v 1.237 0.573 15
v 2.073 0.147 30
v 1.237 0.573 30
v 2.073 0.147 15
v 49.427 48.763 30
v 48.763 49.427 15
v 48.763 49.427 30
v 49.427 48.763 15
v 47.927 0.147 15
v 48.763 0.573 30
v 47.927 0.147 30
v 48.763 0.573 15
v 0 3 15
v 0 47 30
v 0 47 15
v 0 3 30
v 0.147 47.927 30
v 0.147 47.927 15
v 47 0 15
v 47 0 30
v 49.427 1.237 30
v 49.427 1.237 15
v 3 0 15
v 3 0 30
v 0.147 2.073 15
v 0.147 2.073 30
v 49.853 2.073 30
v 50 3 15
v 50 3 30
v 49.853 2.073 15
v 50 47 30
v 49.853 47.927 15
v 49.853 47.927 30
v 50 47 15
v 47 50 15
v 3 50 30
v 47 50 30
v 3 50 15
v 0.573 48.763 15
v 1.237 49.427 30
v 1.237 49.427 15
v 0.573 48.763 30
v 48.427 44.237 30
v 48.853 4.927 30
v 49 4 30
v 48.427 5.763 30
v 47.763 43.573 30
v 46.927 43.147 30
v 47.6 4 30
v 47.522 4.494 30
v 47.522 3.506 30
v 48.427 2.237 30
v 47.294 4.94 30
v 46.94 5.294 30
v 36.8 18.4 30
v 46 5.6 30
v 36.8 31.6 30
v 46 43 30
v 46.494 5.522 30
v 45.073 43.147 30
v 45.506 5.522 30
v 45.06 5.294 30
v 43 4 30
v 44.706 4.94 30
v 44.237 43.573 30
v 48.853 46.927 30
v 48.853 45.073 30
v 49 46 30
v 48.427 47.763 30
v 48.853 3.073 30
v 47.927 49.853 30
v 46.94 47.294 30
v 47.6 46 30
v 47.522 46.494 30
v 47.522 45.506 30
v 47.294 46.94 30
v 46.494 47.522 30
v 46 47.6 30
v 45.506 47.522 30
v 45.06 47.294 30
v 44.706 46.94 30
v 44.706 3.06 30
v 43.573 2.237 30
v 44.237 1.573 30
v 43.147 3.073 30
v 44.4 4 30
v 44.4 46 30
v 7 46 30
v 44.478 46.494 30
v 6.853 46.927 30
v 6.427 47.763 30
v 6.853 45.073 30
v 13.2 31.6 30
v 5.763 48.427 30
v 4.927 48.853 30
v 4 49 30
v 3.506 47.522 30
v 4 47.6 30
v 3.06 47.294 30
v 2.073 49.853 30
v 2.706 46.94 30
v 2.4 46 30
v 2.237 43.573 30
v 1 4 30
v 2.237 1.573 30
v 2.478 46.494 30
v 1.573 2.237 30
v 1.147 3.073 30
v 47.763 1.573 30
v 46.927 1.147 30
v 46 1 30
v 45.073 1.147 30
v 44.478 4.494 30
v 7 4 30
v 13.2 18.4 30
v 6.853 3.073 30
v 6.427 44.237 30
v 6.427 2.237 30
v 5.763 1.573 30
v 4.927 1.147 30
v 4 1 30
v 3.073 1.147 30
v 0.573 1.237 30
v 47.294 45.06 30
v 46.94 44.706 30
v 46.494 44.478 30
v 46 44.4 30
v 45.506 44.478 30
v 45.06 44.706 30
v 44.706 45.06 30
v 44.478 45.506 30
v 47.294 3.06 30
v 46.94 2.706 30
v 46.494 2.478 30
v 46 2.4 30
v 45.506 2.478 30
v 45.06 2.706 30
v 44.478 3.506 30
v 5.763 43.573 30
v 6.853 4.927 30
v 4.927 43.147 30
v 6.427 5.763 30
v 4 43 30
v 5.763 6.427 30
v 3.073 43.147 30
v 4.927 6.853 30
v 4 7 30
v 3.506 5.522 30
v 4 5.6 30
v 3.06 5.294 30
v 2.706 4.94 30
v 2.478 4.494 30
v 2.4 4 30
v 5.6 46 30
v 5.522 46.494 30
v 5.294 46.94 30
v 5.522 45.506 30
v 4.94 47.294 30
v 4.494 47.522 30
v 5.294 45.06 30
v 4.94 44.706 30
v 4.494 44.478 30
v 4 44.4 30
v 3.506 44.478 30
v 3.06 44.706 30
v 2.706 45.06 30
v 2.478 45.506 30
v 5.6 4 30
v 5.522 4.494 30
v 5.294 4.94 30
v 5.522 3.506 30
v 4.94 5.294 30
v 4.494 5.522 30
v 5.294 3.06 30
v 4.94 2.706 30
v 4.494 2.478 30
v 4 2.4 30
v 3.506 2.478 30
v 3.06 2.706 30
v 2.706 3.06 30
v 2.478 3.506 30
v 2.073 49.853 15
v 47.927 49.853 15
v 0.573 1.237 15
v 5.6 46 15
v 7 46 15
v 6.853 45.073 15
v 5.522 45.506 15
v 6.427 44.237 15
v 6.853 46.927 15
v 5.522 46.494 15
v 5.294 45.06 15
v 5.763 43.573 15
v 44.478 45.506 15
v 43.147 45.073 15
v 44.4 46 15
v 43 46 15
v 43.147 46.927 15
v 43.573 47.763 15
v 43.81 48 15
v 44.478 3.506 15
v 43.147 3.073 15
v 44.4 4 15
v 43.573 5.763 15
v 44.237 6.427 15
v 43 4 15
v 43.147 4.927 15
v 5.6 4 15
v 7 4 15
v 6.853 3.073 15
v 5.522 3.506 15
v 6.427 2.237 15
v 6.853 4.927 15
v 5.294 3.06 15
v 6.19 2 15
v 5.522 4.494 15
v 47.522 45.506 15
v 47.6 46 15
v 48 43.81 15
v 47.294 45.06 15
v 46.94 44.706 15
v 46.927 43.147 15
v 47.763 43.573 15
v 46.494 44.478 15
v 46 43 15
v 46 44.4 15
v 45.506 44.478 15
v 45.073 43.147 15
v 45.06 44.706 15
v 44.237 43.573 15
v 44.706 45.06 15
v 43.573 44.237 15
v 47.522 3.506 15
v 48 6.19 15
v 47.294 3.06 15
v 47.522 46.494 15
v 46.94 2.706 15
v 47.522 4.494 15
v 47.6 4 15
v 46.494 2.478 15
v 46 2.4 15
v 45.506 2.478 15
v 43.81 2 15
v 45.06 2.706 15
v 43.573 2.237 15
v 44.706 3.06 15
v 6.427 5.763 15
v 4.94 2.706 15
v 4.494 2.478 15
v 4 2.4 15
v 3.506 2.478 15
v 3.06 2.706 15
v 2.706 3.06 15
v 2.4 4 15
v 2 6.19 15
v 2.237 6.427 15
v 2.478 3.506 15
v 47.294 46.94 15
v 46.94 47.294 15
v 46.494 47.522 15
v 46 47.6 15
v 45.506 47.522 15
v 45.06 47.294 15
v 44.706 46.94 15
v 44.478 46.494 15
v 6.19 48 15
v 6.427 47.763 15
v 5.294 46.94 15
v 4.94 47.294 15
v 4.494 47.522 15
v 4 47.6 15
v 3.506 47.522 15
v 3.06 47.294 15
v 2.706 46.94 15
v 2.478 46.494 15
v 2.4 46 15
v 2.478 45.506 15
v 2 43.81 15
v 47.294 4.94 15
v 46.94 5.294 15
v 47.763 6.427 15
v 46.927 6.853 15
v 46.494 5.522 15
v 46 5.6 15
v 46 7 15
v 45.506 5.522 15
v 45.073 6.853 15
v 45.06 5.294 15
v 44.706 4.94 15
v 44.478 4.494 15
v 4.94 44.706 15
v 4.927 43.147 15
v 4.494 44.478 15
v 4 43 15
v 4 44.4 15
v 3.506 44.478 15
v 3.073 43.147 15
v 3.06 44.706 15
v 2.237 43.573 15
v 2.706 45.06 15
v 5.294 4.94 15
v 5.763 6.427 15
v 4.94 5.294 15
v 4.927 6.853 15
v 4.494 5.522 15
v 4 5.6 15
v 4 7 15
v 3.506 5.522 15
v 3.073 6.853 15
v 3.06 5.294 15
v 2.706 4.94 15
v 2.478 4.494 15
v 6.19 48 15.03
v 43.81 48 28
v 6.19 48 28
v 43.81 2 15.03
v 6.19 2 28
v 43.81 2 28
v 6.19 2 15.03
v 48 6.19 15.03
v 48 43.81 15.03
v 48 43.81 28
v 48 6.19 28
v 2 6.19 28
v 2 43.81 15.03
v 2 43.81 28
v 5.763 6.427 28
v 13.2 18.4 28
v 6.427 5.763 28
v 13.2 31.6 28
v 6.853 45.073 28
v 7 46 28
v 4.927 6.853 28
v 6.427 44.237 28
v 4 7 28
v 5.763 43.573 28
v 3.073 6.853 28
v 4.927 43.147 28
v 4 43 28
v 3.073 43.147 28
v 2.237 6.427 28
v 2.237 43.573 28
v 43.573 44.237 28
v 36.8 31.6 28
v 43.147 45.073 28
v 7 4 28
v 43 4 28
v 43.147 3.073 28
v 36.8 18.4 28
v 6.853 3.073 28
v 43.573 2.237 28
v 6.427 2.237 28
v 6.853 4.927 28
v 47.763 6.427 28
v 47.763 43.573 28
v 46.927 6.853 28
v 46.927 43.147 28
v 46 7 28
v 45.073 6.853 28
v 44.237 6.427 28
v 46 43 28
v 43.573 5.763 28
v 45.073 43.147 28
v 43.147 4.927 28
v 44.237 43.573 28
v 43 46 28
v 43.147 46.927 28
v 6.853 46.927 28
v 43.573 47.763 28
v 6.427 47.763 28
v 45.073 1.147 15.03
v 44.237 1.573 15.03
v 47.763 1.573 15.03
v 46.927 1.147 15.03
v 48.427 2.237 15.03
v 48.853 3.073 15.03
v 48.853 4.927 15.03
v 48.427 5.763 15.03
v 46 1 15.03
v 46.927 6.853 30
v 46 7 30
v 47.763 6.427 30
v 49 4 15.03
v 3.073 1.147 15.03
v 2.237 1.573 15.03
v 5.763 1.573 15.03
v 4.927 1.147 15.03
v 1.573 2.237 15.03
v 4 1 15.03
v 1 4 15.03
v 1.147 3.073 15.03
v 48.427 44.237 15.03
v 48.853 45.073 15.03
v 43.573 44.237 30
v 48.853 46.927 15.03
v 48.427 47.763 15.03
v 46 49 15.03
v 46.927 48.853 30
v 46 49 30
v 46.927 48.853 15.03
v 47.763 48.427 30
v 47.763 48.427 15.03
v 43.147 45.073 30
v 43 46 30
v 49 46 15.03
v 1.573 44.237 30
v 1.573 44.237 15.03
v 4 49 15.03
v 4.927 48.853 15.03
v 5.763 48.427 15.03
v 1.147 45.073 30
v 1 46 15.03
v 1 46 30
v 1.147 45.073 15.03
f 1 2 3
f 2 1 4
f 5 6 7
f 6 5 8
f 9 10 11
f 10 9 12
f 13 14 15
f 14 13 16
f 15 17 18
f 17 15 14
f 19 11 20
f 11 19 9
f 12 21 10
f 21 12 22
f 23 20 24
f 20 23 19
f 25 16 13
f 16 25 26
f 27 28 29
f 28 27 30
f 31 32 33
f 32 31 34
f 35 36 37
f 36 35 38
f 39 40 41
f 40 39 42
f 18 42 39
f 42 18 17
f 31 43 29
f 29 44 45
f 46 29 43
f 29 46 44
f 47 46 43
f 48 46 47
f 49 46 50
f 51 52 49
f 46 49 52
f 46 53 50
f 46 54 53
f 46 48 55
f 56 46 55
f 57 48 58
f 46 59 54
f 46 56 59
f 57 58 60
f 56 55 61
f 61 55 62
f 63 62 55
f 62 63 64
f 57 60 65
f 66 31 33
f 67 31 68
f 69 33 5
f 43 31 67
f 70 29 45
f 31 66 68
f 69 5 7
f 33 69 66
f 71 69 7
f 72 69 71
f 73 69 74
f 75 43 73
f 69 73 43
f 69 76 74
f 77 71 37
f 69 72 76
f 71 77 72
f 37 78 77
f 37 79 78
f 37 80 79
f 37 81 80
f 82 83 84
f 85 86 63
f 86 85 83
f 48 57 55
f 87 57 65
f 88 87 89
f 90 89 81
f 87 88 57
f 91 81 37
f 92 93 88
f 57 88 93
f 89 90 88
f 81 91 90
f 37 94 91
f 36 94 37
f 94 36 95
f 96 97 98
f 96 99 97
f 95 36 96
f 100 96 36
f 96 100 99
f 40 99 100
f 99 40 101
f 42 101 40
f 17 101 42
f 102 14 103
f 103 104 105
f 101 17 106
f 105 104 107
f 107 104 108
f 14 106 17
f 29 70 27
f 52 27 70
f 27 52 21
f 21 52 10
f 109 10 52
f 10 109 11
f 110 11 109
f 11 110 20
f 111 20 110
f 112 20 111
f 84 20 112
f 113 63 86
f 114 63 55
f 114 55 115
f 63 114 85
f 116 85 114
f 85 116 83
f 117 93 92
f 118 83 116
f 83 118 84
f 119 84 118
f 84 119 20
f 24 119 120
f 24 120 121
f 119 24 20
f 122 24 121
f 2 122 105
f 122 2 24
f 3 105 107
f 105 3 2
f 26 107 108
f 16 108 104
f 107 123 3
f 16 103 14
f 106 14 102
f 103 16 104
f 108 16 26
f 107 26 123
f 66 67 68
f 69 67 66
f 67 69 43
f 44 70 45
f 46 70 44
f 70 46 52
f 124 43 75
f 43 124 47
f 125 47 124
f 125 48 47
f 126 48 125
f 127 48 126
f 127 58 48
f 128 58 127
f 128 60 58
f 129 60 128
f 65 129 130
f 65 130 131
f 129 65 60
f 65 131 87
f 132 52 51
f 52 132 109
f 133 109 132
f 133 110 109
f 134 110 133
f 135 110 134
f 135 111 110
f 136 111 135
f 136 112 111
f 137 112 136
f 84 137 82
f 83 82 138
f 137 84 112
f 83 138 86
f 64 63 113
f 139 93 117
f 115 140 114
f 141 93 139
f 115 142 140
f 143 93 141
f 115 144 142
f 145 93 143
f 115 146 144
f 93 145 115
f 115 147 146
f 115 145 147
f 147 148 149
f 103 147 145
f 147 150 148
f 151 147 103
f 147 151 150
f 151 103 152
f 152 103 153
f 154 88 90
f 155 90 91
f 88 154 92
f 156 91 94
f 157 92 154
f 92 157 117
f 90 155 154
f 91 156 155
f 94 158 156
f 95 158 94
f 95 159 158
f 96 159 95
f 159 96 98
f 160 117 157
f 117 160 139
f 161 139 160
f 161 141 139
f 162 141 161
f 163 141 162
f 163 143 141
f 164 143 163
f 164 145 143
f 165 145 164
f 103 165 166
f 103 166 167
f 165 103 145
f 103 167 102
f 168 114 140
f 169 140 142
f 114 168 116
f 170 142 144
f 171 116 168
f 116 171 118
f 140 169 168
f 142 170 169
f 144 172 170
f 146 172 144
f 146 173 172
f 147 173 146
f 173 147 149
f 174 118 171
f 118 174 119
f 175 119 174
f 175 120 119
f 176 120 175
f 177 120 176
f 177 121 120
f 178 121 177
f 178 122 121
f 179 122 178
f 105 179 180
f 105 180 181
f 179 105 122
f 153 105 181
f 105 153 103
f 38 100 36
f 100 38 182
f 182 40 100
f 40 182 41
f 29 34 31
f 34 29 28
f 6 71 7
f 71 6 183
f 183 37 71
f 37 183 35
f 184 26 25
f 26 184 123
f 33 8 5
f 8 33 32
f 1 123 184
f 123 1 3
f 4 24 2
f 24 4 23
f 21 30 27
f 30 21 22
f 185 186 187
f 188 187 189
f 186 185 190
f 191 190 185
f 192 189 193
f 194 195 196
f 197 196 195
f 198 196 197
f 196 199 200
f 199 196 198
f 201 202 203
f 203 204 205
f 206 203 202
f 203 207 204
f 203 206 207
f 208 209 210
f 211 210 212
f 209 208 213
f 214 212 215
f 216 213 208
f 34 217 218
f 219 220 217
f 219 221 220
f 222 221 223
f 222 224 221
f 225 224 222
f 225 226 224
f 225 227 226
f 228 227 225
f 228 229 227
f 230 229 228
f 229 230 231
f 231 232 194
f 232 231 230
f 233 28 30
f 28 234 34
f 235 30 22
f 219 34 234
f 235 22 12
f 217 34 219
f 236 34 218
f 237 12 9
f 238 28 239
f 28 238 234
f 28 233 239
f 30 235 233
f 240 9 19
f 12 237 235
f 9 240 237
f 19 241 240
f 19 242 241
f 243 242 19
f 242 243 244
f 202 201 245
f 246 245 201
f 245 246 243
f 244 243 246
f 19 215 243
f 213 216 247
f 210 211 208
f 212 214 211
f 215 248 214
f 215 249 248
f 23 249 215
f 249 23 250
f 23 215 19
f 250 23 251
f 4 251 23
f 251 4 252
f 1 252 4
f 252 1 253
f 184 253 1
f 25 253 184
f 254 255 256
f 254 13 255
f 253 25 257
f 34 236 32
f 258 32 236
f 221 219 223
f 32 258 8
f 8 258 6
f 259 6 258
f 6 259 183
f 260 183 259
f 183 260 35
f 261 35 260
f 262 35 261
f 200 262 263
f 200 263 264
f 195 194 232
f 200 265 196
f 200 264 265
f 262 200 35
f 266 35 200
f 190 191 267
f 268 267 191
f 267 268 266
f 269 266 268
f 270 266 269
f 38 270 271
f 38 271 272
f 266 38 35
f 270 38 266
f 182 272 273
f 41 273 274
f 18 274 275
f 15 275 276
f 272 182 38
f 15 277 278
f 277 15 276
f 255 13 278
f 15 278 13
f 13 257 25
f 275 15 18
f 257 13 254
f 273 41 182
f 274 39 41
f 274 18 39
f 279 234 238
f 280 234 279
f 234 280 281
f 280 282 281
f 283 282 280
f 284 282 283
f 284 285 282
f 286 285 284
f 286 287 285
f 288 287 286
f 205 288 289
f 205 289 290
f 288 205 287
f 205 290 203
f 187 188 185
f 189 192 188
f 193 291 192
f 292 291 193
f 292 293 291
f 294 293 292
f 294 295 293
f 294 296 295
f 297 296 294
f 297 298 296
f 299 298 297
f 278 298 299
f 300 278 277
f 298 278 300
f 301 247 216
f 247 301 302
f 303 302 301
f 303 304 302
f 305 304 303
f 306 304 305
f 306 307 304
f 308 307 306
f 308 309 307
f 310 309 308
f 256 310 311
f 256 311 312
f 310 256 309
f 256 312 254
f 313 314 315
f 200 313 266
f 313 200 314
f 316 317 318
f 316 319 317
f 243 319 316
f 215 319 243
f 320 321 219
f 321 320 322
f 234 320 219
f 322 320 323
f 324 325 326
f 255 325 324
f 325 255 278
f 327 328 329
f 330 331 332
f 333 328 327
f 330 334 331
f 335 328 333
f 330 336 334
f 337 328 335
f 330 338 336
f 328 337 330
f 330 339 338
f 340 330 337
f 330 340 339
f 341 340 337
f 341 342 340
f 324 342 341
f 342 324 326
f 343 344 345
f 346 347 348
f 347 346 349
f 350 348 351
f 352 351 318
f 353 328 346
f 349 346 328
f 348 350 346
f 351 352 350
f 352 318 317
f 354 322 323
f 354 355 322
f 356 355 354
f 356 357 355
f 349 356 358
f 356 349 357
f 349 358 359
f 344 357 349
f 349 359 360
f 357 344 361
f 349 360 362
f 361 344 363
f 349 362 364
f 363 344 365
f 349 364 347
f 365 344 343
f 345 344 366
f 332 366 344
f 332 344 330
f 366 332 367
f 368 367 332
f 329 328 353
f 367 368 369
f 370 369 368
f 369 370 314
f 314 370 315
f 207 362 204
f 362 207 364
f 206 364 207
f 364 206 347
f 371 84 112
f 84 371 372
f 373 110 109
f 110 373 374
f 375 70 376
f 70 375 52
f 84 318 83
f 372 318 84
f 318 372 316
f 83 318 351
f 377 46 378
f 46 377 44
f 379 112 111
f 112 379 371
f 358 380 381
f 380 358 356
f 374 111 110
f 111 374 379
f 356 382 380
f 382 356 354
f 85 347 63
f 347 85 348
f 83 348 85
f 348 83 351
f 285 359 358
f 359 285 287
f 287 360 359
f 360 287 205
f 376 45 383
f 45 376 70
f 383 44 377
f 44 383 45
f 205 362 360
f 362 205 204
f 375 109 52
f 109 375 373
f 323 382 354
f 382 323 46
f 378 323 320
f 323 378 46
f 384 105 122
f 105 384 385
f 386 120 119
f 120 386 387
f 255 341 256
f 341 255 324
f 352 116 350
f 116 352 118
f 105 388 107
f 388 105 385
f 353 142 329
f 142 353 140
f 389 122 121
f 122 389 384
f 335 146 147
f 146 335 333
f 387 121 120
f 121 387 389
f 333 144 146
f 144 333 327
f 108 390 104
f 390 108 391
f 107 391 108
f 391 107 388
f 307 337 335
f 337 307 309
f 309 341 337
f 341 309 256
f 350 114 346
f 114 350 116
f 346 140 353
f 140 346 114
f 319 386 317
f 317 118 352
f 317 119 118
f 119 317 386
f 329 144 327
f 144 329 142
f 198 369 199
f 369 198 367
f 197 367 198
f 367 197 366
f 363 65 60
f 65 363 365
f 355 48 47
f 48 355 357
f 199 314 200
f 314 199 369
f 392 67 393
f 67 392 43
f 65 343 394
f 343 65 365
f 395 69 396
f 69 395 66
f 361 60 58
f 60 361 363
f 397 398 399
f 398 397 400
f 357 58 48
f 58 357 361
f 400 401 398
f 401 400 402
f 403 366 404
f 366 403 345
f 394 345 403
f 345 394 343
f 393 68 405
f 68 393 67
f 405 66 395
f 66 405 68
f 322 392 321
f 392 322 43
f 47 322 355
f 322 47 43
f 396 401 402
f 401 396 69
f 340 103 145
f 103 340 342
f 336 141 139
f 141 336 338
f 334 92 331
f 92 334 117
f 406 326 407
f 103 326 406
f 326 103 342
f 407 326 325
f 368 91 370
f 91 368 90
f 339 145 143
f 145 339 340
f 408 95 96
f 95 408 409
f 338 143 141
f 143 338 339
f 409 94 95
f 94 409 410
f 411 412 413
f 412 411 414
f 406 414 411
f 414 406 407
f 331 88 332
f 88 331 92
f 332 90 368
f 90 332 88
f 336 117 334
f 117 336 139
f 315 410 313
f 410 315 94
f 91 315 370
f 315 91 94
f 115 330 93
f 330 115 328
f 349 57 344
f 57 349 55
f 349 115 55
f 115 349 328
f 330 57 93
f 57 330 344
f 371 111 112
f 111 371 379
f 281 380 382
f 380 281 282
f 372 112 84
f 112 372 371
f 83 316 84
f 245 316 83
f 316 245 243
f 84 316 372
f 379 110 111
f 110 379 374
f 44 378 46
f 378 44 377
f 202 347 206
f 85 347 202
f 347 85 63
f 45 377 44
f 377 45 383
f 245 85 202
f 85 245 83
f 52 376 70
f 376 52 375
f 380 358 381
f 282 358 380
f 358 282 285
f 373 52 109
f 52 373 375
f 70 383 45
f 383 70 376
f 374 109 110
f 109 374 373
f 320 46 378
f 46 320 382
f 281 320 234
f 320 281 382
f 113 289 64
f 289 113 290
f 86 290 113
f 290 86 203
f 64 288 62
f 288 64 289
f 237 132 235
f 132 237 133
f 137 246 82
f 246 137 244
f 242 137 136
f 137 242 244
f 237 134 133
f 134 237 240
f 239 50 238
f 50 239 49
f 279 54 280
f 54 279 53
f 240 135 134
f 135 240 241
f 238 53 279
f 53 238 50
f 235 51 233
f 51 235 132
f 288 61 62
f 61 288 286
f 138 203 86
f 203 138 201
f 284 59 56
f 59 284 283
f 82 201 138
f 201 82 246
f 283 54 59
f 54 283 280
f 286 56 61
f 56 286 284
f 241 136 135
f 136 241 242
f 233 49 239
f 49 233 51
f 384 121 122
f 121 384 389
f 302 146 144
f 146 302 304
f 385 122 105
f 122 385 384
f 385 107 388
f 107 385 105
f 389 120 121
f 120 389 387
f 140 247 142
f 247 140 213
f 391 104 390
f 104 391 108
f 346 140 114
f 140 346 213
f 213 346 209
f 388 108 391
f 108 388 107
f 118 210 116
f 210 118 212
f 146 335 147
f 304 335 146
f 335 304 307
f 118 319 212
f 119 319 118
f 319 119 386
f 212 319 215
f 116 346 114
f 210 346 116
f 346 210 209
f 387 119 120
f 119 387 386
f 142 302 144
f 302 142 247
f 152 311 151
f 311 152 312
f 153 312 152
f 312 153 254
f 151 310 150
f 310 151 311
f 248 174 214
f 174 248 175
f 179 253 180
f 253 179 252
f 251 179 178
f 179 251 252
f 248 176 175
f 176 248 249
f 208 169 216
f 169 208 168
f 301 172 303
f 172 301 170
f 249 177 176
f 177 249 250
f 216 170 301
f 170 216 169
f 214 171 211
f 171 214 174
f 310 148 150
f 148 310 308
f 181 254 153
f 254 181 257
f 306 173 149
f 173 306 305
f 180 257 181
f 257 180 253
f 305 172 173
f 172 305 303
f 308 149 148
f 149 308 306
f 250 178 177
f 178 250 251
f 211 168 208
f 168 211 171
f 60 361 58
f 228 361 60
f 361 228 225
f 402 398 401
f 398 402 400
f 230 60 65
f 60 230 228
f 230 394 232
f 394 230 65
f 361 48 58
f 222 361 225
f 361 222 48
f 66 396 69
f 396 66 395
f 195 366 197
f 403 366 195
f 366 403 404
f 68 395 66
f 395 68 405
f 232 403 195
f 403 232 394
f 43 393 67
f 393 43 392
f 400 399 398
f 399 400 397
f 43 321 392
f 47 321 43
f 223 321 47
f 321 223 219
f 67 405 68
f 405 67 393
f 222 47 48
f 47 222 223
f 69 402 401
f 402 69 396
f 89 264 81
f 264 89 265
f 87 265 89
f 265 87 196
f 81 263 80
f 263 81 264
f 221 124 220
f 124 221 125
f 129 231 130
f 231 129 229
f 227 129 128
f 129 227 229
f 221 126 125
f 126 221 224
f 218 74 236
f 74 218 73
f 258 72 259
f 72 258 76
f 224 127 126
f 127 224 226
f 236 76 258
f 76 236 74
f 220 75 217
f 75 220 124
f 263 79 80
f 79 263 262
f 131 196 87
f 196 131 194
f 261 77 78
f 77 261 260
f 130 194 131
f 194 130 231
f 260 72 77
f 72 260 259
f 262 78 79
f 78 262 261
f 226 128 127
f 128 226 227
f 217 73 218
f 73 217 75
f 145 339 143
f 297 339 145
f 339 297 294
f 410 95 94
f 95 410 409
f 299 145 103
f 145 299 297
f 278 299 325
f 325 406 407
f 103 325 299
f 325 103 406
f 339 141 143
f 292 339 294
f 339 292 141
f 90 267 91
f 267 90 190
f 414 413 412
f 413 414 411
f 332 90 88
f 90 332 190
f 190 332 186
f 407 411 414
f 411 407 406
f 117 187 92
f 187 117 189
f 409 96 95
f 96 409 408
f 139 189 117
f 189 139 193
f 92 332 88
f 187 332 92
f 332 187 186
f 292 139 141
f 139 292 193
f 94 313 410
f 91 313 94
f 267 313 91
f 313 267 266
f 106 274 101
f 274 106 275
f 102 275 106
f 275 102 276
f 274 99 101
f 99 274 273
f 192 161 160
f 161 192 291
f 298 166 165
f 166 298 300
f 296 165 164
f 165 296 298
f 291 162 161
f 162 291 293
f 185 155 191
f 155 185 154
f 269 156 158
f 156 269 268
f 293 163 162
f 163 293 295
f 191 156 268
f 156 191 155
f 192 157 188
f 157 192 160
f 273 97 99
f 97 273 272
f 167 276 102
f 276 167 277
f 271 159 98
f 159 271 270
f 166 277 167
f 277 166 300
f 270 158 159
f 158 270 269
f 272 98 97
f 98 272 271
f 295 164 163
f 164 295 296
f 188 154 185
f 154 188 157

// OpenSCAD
// file: servo.scad
h = 22;
w = 22.6;
d = 12.2;
hw = 32;

// translate([0,30,0]) servo_MG90s();

function getcenter() = w/2;

module servo_MG90s() {

    color("Orange") {
         difference() {
            union() {
                cube([w,d,h]);
                translate([-4.5,0,h-3])
                    cube([hw,d,2.5]);
                translate([w-(d/2),d/2,h])
                    cylinder(h=6,r=d/2);
            }
            translate([-2,d/2,h])
                cylinder(h=25,r=1,$fn=20,center=true);
            translate([w+2,d/2,h])
                cylinder(h=25,r=1,$fn=20,center=true);
        }
    } 
}
// main file
include <servo.scad>

nothing = 0.03;
enc_height = 30;
enc_width =  50;
end_depth =  50;
wall_thickness = 2;
$fn =20;
open_lid = 0;
// sercodims
    h = 22;
    w = 22.6;
    d = 12.2;
    hw = 32;
//cap(); // bottom
//bottom();
//projection(cut=false)
translate([enc_width,0,enc_height+(40*open_lid)]) rotate([0,180,0]) lid_top(); // top / lid

module lid_top() {
   screw_points = [[4,4,0],[enc_width-4,4,0],[4,end_depth-4,0],[enc_width-4,end_depth-4,0]];
    difference() {
        cap();
        for (i = [0:len(screw_points)-1]) {
            translate(screw_points[i]) 
            translate([0,0,-nothing])
                cylinder(h=enc_height/2,r=3);
        }
        translate([(enc_width/2)+(w/2),(end_depth/2)-(d/2),h-3.5])
            rotate([0,180,0])
               translate([-0.5,-0.5,0])cube([w+1,d+1,h]);
    }
    
     for (i = [0:len(screw_points)-1]) {
        translate(screw_points[i]) {
            difference() {
                cylinder(h=enc_height/2,r=3);
                translate([0,0,-nothing]) {
                    cylinder(h=(enc_height/2)+(2*nothing),r=1.6); 
                }
            }
        } 


    }
 /*
    translate([(enc_width/2)+(w/2),(end_depth/2)-(d/2),h-3.5])
        rotate([0,180,0])
            servo_MG90s();
 */
}

module bottom() {
   screw_points = [[4,4,0],[enc_width-4,4,0],[4,end_depth-4,0],[enc_width-4,end_depth-4,0]];
    difference() {
        cap();
        for (i = [0:len(screw_points)-1]) {
            translate(screw_points[i]) 
            translate([0,0,-nothing])
                cylinder(h=enc_height/2,r=3);
        }
    }
    
     for (i = [0:len(screw_points)-1]) {
        translate(screw_points[i]) {
            difference() {
                cylinder(h=enc_height/2,r=3);
                translate([0,0,-nothing]) {
                    cylinder(h=(enc_height/2)+(2*nothing),r=1.6); 
                }
            }
        } 
    }
}

module cap() {
    difference() {
        round_cube([enc_width,end_depth,enc_height/2],3);
        translate([wall_thickness,wall_thickness,(wall_thickness)])
            round_cube([  enc_width-(2*wall_thickness),
                        end_depth-(2*wall_thickness),
                        (enc_height/2)
                        ],2.5);
    }    
}
//round_cube([enc_width,end_depth,enc_height/2],2);

module round_cube(size,edgeradius) {
   echo(size[0],size[1],size[2]);
   translate([edgeradius,edgeradius,0]) minkowski() {
        cube([  size[0]-(2*edgeradius),
                size[1]-(2*edgeradius),
                size[2]/2] );
        cylinder(r=edgeradius,h=size[2]/2);
  }
}
